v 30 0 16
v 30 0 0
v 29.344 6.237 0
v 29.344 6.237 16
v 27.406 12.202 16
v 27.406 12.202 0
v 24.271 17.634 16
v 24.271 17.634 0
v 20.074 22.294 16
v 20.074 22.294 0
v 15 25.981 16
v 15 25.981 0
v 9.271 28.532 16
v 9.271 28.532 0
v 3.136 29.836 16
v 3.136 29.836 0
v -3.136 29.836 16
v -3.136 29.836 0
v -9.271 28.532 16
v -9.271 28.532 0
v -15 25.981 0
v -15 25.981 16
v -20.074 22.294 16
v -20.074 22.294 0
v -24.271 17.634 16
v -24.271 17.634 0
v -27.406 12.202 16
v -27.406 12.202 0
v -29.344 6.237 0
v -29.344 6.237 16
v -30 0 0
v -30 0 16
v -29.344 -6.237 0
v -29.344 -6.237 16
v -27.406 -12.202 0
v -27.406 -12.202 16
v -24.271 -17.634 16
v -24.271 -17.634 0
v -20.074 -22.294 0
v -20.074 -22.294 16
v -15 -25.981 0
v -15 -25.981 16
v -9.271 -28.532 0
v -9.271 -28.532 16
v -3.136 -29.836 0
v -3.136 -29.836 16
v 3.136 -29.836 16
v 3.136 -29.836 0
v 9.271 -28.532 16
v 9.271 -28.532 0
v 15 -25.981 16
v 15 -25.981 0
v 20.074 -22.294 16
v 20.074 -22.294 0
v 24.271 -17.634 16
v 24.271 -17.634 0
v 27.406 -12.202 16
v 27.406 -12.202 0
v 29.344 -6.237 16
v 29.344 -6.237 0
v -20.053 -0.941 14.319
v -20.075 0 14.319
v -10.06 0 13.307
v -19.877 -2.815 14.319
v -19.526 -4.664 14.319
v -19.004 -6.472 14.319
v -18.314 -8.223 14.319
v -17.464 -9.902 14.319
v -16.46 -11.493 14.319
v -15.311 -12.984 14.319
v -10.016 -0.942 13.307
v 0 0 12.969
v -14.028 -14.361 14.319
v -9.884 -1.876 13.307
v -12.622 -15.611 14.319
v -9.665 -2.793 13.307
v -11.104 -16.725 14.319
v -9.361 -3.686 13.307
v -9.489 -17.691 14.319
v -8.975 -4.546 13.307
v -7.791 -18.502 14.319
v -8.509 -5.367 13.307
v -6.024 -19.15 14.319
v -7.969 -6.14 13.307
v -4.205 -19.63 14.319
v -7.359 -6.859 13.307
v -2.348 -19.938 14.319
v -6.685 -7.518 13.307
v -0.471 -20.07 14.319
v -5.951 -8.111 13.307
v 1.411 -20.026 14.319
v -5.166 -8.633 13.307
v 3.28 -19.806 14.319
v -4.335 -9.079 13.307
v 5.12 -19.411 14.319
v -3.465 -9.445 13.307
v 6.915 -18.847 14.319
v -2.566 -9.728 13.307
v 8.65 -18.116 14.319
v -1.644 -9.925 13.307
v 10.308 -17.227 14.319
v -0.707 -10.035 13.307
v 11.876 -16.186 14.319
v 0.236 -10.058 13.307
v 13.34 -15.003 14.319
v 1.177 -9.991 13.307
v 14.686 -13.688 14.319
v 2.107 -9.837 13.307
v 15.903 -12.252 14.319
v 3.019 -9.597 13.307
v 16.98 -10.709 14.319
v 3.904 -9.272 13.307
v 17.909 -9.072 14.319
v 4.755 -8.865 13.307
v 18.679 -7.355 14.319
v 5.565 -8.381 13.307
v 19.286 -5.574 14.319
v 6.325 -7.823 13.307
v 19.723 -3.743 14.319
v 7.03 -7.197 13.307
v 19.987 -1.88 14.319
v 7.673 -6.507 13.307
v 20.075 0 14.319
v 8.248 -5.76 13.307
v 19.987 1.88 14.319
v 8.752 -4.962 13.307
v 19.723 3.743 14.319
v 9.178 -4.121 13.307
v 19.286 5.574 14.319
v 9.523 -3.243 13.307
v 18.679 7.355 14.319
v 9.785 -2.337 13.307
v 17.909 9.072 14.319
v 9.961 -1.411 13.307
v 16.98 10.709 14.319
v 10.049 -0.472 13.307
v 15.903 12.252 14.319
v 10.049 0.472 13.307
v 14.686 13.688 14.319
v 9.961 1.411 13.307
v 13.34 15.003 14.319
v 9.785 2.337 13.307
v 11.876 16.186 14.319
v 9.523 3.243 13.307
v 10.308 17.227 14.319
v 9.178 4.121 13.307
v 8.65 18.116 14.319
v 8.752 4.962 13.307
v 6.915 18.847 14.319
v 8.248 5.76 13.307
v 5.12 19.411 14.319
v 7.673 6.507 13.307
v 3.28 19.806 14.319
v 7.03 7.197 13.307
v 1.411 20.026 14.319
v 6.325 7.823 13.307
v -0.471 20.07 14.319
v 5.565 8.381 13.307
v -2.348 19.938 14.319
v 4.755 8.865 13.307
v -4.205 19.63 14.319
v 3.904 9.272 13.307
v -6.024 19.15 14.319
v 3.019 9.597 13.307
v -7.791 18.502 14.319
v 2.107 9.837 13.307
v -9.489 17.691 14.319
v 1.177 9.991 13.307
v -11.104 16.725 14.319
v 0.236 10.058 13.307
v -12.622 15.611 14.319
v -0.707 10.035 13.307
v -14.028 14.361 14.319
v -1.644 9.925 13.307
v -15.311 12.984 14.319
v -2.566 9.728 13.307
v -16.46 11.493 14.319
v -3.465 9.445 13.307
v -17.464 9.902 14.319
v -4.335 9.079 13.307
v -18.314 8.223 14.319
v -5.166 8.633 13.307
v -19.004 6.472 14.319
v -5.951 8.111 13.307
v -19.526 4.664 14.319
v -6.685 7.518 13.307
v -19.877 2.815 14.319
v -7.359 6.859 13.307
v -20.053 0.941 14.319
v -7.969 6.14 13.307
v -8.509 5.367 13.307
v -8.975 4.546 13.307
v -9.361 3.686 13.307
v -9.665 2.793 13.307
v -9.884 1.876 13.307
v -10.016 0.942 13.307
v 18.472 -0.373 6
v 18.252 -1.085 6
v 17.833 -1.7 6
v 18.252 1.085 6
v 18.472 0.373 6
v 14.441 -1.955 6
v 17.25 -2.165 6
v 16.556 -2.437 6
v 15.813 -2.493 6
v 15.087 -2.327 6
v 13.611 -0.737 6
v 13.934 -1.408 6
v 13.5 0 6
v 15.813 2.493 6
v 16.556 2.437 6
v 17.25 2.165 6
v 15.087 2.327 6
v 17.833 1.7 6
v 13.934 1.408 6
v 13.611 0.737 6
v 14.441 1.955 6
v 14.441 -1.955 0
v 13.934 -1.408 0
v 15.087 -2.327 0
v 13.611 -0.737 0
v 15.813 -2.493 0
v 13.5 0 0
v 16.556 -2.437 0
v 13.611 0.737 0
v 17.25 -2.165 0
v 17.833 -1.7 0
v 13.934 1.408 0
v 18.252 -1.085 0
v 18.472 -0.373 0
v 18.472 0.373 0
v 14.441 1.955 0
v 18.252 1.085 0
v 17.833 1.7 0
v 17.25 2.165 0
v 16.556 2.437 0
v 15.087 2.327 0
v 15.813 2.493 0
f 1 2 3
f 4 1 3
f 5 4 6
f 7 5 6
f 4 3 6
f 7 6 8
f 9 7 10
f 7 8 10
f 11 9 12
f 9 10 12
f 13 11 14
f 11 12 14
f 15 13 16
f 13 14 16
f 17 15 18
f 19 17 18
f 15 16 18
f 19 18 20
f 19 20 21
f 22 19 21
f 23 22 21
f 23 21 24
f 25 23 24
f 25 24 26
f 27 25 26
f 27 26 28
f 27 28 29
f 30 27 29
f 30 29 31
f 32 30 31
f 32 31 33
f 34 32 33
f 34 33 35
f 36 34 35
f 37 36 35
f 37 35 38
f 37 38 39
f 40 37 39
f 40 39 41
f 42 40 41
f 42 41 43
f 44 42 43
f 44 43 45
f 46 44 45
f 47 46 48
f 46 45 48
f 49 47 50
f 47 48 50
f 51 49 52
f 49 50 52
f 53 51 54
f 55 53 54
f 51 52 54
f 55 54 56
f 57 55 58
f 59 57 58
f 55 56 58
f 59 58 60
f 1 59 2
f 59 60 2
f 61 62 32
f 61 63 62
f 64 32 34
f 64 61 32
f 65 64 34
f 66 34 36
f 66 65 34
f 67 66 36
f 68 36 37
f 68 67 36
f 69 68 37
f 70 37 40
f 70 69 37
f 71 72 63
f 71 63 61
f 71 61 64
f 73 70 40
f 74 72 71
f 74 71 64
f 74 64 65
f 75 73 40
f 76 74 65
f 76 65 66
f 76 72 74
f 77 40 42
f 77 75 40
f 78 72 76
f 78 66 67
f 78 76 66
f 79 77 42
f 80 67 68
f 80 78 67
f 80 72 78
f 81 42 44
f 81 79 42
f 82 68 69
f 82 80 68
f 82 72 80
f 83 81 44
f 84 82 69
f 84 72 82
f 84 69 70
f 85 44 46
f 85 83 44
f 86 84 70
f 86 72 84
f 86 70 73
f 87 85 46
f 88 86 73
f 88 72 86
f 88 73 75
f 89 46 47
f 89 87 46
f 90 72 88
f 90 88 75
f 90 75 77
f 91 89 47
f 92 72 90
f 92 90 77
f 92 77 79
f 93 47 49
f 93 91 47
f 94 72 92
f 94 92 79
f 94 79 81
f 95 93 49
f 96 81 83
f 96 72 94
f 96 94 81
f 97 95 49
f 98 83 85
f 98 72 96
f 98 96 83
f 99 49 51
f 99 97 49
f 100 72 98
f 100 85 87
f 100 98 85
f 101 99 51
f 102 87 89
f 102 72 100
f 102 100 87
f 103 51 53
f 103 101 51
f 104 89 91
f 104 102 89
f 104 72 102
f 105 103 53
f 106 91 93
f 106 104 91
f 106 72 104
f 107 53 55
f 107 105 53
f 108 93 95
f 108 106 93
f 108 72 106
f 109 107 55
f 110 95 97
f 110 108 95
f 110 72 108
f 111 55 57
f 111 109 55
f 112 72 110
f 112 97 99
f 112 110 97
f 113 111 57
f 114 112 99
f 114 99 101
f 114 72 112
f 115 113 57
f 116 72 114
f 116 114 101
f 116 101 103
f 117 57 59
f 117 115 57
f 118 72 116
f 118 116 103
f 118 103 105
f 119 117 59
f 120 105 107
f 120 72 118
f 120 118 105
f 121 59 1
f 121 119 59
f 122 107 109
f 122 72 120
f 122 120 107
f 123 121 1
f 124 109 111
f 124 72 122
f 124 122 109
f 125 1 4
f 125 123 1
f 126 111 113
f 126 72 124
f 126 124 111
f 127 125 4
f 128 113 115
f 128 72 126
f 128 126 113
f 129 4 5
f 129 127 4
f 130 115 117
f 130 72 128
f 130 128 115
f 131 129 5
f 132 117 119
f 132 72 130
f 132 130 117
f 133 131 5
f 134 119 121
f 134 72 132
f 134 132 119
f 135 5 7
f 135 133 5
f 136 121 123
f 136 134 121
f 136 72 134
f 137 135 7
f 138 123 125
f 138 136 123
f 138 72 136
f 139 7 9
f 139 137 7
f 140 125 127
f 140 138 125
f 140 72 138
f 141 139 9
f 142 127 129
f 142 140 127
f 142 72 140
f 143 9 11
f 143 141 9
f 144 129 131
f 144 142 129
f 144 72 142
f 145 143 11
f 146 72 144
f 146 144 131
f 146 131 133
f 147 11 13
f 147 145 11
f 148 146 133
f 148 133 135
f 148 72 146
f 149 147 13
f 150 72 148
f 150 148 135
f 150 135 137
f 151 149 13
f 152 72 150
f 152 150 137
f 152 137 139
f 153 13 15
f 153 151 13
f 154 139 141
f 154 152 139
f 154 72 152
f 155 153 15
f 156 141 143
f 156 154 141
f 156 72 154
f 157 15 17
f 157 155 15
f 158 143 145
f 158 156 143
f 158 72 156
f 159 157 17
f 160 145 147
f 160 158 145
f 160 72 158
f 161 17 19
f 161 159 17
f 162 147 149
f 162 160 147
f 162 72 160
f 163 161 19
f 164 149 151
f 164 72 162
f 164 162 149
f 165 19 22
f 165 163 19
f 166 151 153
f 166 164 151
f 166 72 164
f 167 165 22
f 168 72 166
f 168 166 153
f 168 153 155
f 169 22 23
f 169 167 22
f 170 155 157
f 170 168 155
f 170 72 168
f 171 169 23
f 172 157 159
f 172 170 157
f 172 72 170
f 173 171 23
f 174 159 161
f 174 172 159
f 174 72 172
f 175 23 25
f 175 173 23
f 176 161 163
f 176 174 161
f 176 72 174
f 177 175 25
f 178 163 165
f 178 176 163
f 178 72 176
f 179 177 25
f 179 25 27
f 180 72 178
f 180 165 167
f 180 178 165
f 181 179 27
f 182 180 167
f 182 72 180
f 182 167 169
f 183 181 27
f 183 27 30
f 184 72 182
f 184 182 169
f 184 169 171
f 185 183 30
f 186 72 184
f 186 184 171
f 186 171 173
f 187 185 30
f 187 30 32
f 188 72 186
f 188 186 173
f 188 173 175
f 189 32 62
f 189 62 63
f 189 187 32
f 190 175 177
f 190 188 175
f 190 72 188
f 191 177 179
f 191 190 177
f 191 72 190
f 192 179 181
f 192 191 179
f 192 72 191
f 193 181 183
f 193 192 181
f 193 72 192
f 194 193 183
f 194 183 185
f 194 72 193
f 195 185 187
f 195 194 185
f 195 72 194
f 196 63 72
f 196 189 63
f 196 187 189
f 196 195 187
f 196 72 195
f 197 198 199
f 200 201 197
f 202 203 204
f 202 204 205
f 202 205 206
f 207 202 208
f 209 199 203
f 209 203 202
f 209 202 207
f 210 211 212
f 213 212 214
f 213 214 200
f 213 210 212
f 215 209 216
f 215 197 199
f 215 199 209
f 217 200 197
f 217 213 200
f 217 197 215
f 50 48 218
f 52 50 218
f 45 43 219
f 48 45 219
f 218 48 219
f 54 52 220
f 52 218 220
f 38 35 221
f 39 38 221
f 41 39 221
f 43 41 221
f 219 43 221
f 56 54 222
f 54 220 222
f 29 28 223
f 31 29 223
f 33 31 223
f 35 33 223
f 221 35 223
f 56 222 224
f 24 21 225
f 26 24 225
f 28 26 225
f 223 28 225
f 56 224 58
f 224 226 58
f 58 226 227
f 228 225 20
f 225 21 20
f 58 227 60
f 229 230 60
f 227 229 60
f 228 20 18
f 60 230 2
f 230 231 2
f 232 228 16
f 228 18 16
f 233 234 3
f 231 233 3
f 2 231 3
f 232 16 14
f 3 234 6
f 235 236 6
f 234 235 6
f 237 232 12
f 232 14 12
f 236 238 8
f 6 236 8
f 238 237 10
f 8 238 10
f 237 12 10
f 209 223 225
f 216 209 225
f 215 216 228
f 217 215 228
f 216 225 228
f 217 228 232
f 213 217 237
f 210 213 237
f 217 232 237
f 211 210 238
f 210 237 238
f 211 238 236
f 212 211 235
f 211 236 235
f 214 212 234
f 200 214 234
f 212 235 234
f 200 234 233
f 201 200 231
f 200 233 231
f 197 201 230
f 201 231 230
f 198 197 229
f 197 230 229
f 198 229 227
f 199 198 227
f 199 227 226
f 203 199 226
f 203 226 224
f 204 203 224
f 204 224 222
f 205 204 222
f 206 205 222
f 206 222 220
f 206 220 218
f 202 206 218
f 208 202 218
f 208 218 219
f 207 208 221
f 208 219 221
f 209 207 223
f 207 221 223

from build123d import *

# Parameters (mm, degrees)
SKETCH1_R           = 30
BOSS_EXTRUDE1_DEPTH = 16
SKETCH4_R           = 2.5
CUT_EXTRUDE2_DEPTH  = 6


with BuildPart() as part:
    # Sketch1 → Boss-Extrude1 (new body)
    with BuildSketch(Plane.XY):
        Circle(SKETCH1_R)
    extrude(amount=BOSS_EXTRUDE1_DEPTH)

    # Sketch3 → Cut-Revolve2 (revolve, cut)
    with BuildSketch(Plane(origin=(0, 0, 0), x_dir=(1, 0, 0), z_dir=(0, 1, 0)), mode=Mode.PRIVATE) as cut_revolve2_sk:
        with BuildLine():
            Line((0, -16), (30, -16))
            ThreePointArc((30, -16), (15.076344301, -13.728961616), (0, -12.969384567))
            Line((0, -12.969384567), (0, -16))
        make_face()
    revolve(cut_revolve2_sk.sketch.rotate(Axis((0, 0, 12.969384567), (0, 0, 1)), 180), axis=Axis((0, 0, 12.969384567), (0, 0, 1)), mode=Mode.SUBTRACT)

    # Sketch4 → Cut-Extrude2 (cut)
    with BuildSketch(Plane(origin=(0, 0, 0), x_dir=(-1, 0, 0), z_dir=(0, 0, -1))):
        with Locations((-16, 0)):
            Circle(SKETCH4_R)
    extrude(amount=-CUT_EXTRUDE2_DEPTH, mode=Mode.SUBTRACT)


solid = part.part
